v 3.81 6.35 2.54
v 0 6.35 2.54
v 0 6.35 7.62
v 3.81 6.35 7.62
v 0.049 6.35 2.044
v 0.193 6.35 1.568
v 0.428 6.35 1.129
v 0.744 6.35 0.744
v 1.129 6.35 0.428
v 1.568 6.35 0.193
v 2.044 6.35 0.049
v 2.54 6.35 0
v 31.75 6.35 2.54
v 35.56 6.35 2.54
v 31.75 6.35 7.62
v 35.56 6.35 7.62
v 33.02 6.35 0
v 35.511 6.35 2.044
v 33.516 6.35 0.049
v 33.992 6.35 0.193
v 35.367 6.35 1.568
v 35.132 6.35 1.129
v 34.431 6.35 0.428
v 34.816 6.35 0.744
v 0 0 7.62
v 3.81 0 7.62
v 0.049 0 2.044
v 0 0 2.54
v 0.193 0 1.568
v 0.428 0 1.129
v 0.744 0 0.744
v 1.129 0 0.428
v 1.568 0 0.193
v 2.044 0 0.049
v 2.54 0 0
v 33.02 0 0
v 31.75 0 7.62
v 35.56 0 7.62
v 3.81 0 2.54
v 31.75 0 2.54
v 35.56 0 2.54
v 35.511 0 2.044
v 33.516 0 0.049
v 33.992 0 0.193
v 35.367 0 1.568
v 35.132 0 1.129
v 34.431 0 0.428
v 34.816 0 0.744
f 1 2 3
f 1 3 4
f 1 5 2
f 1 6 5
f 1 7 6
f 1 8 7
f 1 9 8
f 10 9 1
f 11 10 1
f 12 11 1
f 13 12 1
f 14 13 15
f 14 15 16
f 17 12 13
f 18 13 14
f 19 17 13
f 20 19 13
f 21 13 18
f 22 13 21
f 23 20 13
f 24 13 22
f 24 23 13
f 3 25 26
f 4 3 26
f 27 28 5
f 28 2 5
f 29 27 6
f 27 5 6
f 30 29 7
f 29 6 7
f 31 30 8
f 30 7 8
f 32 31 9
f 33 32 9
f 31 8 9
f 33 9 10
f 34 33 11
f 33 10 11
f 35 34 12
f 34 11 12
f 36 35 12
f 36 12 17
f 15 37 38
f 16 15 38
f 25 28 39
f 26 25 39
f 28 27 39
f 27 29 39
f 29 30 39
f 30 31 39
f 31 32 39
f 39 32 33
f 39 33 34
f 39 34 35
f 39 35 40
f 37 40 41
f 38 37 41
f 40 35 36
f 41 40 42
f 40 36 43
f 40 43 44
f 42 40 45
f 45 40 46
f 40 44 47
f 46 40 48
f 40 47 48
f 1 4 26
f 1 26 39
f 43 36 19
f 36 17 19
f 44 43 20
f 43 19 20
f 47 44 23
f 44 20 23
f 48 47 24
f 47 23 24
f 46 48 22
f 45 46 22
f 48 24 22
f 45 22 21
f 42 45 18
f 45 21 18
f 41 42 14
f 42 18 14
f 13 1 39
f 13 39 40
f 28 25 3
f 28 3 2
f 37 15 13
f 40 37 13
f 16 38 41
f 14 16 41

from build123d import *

# Parameters (mm, degrees)
SKETCH1_W           = 35.56
SKETCH1_H           = 7.62
BOSS_EXTRUDE1_DEPTH = 6.35
SKETCH2_W           = 27.94
SKETCH2_H           = 5.08
CUT_EXTRUDE1_DEPTH  = 37.917482309
FILLET1_R           = 2.54


with BuildPart() as part:
    # Sketch1 → Boss-Extrude1 (new body)
    with BuildSketch(Plane(origin=(0, 0, 0), x_dir=(1, 0, 0), z_dir=(0, 1, 0))):
        with Locations((17.78, -3.81)):
            Rectangle(SKETCH1_W, SKETCH1_H)
    extrude(amount=BOSS_EXTRUDE1_DEPTH)

    # Sketch2 → Cut-Extrude1 (cut, through all)
    with BuildSketch(Plane(origin=(0, 6.35, 0), x_dir=(1, 0, 0), z_dir=(0, 1, 0))):
        with Locations((17.78, -5.08)):
            Rectangle(SKETCH2_W, SKETCH2_H)
    extrude(amount=-CUT_EXTRUDE1_DEPTH, mode=Mode.SUBTRACT)

    # Fillet1
    fillet1_edges = [part.edges().sort_by_distance(p)[0] for p in [
        (0, 3.175, 0),
        (35.56, 3.175, 0),
    ]]
    fillet(fillet1_edges, radius=FILLET1_R)


solid = part.part
